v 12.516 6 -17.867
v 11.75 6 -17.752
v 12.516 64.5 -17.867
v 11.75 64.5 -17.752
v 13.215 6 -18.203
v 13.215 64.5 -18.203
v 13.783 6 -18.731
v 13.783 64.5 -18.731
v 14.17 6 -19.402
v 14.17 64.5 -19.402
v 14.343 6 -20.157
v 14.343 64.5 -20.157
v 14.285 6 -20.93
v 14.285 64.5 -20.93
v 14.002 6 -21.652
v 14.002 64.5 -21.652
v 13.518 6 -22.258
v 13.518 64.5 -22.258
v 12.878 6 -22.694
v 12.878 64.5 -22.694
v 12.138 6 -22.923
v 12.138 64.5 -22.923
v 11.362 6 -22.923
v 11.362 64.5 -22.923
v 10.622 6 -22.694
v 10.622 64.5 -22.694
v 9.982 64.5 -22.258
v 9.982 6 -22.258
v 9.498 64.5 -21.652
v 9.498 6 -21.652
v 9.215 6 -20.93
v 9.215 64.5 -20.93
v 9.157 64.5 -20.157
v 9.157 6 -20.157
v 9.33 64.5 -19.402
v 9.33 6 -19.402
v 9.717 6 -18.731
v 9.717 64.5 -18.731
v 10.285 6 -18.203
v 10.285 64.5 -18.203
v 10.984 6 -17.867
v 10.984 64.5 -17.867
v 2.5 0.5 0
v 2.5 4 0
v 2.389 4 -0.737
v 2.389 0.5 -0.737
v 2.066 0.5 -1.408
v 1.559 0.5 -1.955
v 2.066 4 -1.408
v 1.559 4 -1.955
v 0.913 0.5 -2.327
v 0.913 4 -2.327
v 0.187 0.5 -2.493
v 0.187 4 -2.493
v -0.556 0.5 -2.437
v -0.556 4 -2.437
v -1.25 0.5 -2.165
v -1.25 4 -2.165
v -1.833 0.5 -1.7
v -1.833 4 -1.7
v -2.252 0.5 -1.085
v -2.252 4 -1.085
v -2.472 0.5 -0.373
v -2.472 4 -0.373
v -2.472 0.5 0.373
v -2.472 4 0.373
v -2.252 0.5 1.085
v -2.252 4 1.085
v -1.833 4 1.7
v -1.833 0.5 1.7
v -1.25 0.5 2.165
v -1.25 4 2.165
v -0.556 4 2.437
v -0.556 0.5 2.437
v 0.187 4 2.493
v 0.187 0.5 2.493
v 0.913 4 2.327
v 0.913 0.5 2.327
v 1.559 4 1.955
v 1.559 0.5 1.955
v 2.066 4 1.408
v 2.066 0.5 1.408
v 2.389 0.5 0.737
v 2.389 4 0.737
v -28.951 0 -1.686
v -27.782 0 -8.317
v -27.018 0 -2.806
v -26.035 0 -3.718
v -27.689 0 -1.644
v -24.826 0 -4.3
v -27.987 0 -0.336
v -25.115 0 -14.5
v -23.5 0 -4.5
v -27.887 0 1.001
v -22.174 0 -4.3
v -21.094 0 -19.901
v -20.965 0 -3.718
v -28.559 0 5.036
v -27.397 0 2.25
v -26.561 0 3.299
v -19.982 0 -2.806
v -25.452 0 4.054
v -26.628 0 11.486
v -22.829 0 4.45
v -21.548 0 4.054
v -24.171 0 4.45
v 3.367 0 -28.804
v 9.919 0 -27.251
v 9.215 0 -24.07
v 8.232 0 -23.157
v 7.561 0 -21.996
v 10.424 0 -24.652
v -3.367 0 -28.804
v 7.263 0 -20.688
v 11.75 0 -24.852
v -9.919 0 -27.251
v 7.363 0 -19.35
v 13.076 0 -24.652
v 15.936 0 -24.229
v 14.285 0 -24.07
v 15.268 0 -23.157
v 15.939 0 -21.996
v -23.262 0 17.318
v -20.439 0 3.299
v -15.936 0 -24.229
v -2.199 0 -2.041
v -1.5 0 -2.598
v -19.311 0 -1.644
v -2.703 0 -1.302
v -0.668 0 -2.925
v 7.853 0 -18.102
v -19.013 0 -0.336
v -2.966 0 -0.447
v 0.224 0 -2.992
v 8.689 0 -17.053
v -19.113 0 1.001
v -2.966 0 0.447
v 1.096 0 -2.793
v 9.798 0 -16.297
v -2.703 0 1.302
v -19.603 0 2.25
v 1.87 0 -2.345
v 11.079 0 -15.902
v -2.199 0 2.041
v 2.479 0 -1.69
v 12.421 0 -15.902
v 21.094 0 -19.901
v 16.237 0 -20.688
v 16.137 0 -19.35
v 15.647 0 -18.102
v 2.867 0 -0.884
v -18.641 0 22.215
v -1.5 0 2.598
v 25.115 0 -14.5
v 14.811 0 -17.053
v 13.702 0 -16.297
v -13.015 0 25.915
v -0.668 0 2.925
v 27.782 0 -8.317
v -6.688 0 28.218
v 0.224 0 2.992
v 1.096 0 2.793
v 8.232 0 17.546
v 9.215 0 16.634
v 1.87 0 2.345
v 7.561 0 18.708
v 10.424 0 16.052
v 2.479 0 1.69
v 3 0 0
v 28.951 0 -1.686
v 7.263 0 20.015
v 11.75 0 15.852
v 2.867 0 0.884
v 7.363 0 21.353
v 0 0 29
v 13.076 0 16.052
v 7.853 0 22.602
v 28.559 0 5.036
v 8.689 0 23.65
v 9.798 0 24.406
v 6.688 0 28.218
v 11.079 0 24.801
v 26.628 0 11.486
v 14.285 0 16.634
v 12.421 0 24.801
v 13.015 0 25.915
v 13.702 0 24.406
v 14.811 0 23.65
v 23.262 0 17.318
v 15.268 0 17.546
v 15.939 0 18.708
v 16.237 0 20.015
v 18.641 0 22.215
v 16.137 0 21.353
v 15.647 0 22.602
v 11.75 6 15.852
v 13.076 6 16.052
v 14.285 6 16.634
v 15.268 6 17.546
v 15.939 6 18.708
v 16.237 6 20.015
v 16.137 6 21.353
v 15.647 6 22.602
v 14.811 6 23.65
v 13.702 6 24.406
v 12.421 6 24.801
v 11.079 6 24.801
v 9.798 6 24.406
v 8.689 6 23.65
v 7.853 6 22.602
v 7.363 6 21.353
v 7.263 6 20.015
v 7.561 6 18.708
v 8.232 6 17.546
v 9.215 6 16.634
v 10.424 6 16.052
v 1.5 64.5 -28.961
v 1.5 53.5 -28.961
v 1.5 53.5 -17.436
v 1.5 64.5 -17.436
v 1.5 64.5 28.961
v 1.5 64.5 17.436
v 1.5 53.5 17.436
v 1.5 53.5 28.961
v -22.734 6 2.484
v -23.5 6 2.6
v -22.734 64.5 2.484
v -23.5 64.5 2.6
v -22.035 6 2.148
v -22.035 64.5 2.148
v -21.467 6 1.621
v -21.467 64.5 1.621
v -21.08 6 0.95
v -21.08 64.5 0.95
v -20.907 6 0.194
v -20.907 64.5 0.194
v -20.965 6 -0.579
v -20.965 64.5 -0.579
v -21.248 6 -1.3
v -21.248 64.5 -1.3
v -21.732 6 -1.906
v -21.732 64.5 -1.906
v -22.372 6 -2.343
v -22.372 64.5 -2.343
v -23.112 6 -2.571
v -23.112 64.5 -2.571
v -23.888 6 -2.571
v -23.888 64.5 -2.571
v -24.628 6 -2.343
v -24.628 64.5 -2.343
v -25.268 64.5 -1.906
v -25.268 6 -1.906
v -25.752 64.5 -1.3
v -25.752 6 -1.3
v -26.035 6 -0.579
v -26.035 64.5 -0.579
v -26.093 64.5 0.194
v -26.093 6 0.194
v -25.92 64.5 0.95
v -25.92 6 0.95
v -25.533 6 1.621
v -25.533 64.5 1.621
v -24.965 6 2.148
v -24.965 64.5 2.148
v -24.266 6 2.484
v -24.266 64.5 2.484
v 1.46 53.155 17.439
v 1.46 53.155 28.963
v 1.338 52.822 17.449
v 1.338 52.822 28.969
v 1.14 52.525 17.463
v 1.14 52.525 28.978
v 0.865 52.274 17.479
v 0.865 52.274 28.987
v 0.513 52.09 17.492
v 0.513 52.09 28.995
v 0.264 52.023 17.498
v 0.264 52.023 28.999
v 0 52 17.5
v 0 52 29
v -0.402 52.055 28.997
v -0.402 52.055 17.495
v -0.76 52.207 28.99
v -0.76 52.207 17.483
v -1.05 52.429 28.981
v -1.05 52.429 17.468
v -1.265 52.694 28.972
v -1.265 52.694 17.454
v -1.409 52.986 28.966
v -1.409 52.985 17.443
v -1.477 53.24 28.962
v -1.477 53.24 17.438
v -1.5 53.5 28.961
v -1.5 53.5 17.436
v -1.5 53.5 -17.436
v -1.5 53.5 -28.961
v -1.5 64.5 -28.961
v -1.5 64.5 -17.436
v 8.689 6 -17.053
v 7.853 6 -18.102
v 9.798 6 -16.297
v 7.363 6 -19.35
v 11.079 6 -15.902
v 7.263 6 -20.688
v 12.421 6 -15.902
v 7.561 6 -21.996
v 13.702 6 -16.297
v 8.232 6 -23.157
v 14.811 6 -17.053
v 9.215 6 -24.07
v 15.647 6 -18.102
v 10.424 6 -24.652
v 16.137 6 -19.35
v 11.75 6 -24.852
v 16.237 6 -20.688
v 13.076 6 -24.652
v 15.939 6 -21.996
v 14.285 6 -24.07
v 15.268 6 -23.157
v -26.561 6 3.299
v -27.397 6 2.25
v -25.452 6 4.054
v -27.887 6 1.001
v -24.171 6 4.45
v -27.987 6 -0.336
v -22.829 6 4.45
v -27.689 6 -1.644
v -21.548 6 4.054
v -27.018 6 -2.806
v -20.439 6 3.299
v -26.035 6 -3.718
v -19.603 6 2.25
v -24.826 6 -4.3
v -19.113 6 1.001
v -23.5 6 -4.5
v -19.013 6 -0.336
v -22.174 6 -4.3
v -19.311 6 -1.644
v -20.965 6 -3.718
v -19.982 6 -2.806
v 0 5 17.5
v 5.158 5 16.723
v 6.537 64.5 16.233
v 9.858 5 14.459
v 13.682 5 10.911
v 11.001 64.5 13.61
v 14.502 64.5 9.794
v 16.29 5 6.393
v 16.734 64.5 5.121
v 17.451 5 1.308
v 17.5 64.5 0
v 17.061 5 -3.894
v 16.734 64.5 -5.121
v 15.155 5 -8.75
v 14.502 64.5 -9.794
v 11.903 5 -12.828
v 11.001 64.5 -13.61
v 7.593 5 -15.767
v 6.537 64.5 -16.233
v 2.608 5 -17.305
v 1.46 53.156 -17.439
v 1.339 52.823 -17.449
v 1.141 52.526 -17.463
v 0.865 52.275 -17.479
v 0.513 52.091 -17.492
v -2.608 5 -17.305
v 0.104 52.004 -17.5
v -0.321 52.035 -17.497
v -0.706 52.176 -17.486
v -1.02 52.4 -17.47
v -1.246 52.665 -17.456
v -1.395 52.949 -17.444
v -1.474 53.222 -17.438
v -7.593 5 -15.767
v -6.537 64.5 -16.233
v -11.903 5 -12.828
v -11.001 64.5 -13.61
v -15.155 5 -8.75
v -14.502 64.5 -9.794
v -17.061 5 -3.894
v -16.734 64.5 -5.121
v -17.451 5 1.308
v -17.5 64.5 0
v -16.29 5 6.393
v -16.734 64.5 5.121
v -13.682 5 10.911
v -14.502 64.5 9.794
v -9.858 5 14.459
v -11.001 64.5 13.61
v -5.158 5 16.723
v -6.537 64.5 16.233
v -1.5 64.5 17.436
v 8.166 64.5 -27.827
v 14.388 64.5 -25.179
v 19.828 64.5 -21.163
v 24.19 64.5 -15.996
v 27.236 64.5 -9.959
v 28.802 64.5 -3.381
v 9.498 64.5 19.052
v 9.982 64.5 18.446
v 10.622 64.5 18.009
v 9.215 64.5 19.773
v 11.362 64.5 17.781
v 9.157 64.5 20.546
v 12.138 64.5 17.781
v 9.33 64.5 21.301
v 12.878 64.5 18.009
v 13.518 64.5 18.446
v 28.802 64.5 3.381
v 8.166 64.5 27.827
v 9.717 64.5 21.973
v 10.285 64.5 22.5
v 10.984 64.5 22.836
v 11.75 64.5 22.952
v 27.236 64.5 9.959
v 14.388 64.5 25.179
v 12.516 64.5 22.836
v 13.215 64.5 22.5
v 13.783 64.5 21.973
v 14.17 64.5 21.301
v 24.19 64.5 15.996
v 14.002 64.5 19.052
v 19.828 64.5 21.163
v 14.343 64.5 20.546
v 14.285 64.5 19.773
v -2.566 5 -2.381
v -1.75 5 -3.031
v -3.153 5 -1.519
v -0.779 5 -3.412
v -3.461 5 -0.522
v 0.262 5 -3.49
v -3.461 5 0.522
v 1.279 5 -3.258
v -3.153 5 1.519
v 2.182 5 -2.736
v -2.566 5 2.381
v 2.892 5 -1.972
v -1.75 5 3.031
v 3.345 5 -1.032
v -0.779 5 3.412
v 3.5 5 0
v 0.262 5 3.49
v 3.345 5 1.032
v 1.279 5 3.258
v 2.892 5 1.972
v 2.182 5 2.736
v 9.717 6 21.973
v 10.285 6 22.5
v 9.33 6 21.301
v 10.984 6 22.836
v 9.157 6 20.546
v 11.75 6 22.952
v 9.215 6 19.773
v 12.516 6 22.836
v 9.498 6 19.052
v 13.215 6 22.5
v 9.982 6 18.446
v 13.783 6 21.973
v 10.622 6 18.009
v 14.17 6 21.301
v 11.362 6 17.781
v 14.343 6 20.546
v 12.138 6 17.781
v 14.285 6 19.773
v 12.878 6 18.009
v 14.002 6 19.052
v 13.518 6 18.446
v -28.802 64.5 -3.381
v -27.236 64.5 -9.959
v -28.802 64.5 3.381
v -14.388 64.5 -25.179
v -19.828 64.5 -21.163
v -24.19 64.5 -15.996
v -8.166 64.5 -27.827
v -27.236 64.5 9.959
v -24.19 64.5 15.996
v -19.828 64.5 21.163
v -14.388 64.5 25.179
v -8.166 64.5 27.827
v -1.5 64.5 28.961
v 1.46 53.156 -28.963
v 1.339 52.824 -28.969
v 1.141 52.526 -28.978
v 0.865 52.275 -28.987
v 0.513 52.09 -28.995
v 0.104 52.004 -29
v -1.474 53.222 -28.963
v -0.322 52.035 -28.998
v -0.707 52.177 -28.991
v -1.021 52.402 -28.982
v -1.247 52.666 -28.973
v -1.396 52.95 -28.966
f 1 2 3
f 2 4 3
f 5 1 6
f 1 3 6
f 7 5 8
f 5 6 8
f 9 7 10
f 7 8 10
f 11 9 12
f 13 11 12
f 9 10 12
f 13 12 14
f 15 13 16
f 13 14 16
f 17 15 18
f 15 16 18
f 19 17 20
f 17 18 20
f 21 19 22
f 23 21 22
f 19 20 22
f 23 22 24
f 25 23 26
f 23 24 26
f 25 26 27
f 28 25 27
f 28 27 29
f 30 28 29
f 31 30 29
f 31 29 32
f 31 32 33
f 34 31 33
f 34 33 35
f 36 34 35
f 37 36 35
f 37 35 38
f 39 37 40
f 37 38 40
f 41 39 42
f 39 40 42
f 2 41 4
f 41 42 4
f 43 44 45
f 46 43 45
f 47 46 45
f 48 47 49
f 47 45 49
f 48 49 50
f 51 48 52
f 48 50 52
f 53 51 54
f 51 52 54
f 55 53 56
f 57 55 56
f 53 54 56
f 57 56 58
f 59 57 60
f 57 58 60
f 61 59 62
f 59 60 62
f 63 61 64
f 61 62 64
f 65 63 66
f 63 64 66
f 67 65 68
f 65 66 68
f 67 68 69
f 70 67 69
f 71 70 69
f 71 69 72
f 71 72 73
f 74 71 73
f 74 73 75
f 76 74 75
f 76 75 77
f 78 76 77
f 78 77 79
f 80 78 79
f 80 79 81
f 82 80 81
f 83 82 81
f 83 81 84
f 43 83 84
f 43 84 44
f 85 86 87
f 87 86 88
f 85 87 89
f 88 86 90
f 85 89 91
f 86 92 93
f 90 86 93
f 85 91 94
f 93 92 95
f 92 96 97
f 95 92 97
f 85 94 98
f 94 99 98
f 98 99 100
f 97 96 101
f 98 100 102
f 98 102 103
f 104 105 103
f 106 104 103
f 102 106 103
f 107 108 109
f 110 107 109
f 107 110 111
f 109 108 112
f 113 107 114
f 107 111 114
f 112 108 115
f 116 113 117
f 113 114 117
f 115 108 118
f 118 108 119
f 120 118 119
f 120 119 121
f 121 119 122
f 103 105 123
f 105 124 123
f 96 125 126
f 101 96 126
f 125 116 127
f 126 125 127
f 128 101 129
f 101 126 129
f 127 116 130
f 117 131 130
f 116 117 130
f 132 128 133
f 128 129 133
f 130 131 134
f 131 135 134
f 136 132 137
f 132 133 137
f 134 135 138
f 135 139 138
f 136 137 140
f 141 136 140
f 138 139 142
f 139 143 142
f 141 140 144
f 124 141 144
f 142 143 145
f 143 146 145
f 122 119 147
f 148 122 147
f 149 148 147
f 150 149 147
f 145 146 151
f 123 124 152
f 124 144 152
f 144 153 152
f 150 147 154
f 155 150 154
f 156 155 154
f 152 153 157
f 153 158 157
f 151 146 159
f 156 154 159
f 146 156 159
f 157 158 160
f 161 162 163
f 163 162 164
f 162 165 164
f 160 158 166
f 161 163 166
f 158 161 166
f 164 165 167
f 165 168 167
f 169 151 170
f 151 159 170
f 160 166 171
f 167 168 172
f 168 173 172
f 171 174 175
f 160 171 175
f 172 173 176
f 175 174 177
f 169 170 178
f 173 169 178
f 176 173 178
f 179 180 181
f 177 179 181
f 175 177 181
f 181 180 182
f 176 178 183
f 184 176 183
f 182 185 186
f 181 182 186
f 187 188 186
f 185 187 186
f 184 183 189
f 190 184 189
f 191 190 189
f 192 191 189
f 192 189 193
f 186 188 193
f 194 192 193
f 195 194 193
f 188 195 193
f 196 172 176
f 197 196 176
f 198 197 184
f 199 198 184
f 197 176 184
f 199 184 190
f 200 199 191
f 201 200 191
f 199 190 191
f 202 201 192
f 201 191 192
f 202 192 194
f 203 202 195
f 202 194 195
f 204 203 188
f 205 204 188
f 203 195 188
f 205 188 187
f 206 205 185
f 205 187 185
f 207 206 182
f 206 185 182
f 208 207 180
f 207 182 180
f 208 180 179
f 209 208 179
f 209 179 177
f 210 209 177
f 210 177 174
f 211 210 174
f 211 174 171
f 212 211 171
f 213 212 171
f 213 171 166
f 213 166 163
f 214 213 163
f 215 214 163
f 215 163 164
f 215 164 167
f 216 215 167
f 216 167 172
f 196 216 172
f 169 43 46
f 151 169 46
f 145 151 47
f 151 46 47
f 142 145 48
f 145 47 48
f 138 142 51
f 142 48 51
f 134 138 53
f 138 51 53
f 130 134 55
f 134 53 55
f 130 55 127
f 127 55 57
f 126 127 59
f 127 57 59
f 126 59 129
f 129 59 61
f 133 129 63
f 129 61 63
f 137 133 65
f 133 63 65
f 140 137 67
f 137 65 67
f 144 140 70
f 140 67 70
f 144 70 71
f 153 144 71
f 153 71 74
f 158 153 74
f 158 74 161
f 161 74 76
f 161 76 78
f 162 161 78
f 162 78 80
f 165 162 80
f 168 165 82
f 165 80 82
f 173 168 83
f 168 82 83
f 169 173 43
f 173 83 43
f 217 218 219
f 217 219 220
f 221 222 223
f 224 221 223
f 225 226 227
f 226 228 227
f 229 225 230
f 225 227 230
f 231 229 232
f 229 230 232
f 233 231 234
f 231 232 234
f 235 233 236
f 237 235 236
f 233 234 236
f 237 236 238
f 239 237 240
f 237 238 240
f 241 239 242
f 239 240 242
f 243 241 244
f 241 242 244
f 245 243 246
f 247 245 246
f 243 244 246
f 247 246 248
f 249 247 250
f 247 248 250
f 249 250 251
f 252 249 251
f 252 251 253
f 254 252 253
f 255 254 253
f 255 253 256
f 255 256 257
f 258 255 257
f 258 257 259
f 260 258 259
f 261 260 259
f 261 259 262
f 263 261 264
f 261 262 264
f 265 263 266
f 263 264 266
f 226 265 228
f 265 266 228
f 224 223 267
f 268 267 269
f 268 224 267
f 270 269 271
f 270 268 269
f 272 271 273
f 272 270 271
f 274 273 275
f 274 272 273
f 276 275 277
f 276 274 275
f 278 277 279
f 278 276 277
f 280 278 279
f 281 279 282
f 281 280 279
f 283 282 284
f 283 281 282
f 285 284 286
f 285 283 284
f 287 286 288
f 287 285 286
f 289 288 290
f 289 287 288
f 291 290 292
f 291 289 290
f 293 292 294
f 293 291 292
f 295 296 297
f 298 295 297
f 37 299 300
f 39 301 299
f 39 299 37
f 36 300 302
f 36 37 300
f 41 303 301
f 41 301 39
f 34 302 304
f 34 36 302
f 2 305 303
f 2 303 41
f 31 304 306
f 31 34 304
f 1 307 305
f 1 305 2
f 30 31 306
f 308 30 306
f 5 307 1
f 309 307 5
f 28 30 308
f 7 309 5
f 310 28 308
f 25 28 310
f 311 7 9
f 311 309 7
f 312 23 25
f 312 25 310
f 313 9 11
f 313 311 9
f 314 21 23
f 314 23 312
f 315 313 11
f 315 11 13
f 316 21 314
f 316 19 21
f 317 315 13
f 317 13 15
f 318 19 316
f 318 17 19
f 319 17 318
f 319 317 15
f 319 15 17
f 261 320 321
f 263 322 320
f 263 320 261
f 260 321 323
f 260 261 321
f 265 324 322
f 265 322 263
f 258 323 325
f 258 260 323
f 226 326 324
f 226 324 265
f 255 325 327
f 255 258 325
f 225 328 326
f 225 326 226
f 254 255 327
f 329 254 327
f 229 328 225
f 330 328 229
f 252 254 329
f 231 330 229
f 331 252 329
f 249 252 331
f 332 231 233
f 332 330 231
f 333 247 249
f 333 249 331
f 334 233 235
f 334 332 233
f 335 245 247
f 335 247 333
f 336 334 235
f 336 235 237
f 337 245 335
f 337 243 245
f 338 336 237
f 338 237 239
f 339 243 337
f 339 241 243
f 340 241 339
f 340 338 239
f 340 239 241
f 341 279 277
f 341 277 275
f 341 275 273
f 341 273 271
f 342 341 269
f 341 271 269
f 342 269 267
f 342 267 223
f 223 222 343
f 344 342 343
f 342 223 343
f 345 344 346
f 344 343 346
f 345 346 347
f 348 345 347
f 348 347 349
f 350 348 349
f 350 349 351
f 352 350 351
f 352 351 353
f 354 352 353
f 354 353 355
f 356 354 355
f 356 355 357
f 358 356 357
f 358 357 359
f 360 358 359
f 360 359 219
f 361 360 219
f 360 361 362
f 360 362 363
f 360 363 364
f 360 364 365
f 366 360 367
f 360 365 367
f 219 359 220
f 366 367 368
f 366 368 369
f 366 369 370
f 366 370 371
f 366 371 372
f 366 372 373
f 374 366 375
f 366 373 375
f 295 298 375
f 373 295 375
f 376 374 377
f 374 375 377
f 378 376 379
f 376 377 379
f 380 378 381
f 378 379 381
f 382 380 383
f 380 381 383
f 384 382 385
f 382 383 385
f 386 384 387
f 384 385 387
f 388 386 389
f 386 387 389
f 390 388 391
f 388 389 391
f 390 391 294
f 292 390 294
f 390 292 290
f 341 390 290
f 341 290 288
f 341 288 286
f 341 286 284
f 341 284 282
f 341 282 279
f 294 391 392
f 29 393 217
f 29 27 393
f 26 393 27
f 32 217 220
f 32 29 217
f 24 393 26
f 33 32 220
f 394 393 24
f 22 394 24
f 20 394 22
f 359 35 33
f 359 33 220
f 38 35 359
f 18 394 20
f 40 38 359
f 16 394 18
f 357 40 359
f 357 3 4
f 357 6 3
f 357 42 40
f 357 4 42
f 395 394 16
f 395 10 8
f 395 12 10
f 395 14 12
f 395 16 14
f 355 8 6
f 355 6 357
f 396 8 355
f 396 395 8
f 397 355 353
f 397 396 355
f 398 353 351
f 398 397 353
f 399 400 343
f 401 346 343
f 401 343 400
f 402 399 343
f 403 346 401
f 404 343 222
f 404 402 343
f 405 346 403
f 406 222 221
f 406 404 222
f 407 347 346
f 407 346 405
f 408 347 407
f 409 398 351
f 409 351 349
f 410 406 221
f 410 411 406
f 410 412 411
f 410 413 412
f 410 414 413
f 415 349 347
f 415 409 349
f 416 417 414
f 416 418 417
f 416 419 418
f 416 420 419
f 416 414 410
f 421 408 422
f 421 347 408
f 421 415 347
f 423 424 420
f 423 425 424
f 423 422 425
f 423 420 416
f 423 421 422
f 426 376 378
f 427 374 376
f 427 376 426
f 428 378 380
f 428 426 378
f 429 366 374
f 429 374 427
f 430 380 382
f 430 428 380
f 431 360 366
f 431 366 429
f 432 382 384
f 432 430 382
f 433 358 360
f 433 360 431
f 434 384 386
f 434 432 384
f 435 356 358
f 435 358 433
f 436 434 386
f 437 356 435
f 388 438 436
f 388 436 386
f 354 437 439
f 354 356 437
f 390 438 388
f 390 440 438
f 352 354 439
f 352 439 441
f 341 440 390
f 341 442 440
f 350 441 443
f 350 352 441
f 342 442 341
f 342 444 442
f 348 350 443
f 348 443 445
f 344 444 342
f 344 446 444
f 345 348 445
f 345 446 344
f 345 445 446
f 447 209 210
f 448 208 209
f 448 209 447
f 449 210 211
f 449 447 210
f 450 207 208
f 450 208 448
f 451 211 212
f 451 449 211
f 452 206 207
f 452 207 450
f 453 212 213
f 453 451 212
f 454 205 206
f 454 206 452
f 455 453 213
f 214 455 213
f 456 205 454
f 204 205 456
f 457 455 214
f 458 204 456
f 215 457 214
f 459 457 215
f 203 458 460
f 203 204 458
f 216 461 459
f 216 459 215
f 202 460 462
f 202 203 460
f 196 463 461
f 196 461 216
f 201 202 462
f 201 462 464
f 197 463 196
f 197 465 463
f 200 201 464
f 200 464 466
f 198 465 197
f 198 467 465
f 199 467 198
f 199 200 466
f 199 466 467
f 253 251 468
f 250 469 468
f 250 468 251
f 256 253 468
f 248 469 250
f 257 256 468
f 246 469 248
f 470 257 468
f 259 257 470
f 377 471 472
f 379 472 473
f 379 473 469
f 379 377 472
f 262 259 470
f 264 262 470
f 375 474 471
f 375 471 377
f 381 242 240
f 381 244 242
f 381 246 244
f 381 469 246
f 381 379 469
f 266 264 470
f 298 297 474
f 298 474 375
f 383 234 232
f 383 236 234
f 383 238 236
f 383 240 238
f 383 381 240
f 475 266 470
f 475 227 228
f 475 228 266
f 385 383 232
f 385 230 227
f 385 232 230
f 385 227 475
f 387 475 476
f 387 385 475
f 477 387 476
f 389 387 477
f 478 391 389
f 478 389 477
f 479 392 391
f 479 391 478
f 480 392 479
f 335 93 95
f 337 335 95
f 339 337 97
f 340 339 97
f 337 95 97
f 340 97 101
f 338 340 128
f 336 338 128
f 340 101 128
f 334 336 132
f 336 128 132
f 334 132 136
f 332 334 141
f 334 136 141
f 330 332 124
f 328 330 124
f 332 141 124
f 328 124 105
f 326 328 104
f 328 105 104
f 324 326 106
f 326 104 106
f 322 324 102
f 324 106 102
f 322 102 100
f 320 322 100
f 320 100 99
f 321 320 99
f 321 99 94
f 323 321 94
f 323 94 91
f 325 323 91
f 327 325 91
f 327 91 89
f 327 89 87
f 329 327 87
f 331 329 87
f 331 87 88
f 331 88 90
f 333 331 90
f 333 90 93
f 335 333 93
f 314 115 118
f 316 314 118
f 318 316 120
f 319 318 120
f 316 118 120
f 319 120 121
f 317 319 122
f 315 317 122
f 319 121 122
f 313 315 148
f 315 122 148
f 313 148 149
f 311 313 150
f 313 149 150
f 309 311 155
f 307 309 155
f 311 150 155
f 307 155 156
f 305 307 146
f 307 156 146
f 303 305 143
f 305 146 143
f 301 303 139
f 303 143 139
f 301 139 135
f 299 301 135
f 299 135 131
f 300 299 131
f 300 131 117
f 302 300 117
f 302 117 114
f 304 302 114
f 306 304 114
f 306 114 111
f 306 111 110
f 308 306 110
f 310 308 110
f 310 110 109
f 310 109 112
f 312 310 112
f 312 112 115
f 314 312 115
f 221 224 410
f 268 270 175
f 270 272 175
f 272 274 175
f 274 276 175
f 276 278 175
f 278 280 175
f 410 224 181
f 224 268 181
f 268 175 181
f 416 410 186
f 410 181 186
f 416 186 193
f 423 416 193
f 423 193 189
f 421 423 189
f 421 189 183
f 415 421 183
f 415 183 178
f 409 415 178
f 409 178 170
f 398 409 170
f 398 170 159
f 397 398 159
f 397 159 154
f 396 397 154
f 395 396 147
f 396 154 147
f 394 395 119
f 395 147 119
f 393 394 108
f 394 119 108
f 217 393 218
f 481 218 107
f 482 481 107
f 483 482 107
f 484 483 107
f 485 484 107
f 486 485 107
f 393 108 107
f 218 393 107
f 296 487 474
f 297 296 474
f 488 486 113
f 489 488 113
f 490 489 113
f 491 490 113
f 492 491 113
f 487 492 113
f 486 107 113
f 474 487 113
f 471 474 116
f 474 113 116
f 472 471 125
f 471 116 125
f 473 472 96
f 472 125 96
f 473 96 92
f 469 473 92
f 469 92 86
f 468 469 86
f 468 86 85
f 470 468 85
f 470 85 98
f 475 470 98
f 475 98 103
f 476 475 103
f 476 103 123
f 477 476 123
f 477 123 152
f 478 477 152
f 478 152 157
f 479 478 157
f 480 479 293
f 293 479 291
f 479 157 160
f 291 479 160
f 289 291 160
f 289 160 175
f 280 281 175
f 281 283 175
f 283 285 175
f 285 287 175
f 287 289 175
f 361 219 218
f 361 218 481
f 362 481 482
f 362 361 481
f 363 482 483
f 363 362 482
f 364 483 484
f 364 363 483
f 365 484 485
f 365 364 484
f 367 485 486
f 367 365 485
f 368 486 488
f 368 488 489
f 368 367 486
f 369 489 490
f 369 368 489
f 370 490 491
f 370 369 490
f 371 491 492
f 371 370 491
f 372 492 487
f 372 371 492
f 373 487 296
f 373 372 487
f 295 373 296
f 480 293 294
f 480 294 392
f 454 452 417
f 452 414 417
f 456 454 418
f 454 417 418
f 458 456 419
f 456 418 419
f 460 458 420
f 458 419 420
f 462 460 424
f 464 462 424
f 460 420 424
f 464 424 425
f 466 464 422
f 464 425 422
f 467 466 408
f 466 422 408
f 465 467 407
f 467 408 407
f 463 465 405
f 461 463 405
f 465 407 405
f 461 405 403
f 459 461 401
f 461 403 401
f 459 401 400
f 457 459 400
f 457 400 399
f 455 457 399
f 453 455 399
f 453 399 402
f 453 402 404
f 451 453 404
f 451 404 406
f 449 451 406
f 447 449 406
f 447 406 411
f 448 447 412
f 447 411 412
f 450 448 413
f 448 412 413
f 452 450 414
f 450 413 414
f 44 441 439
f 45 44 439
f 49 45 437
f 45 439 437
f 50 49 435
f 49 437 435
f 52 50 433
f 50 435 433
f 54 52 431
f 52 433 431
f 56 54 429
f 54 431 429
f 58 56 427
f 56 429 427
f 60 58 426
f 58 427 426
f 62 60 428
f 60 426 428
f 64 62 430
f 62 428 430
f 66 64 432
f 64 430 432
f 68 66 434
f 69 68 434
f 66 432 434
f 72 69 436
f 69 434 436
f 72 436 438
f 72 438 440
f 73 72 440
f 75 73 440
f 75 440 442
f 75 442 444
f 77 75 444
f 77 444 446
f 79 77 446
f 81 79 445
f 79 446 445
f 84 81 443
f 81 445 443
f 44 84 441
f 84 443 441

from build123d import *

# Parameters (mm, degrees)
IZIM1_R                                           = 29
Y_KSEKLIK_EKSTR_ZYON1_DEPTH                       = 64.5
IZIM2_R                                           = 17.5
KES_EKSTR_ZYON1_DEPTH                             = 59.5
F_5_0_5_AP_DELIK1_D                               = 5
F_5_0_5_AP_DELIK1_DEPTH                           = 6
F_5_0_5_AP_DELIK1_TIP                             = 0.909925586
PAH1_SIZE                                         = 0.5
PAH2_SIZE                                         = 1
KES_EKSTR_ZYON2_DEPTH                             = 92.461740635
IZIM15_W                                          = 3
IZIM15_H                                          = 10
KES_EKSTR_ZYON4_DEPTH                             = 92.461740801
M5_ALT_GEN_ALYAN_BA_L_K_R_VIDA_IN_HAV_D           = 5.2
M5_ALT_GEN_ALYAN_BA_L_K_R_VIDA_IN_HAV_DEPTH       = 87.053677391
M5_ALT_GEN_ALYAN_BA_L_K_R_VIDA_IN_HAV_CBORE_D     = 9
M5_ALT_GEN_ALYAN_BA_L_K_R_VIDA_IN_HAV_CBORE_DEPTH = 6
M5_ALT_GEN_ALYAN_BA_L_K_R_VIDA_IN_HAV_TIP         = 0.946322609


with BuildPart() as part:
    # Çizim1 → Yükseklik-Ekstrüzyon1 (new body)
    with BuildSketch(Plane(origin=(0, 0, 0), x_dir=(1, 0, 0), z_dir=(0, 1, 0))):
        with Locations(Location((0, 0, 0), (0, 0, 270))):
            Circle(IZIM1_R)
    extrude(amount=Y_KSEKLIK_EKSTR_ZYON1_DEPTH)

    # Çizim2 → Kes-Ekstrüzyon1 (cut)
    with BuildSketch(Plane(origin=(0, 64.5, 0), x_dir=(1, 0, 0), z_dir=(0, 1, 0))):
        with Locations(Location((0, 0, 0), (0, 0, 270))):
            Circle(IZIM2_R)
    extrude(amount=-KES_EKSTR_ZYON1_DEPTH, mode=Mode.SUBTRACT)

    # Ø5.0 (5) Çap Delik1
    with Locations(Plane(origin=(0, 0, 0), x_dir=(-1, 0, 0), z_dir=(0, -1, 0))):
        with Locations((0, 0)):
            Hole(F_5_0_5_AP_DELIK1_D / 2, depth=F_5_0_5_AP_DELIK1_DEPTH)
            with Locations((0, 0, -(F_5_0_5_AP_DELIK1_DEPTH + F_5_0_5_AP_DELIK1_TIP / 2))):  # 140° drill point
                Cone(0, F_5_0_5_AP_DELIK1_D / 2, F_5_0_5_AP_DELIK1_TIP, mode=Mode.SUBTRACT)

    # Pah1
    pah1_edges = [part.edges().sort_by_distance(p)[0] for p in [
        (-2.5, 0, 0),
    ]]
    chamfer(pah1_edges, length=PAH1_SIZE)

    # Pah2
    pah2_edges = [part.edges().sort_by_distance(p)[0] for p in [
        (-2.5, 5, 0),
    ]]
    chamfer(pah2_edges, length=PAH2_SIZE)

    # Çizim6 → Kes-Ekstrüzyon2 (cut, through all)
    with BuildSketch(Plane.XY.offset(29)):
        with BuildLine():
            Line((-1.5, 53.5), (-1.5, 55.5))
            ThreePointArc((-1.5, 55.5), (0, 57), (1.5, 55.5))
            Line((1.5, 55.5), (1.5, 53.5))
            ThreePointArc((1.5, 53.5), (0, 52), (-1.5, 53.5))
        make_face()
    extrude(amount=-KES_EKSTR_ZYON2_DEPTH, mode=Mode.SUBTRACT)

    # Çizim15 → Kes-Ekstrüzyon4 (cut, through all)
    with BuildSketch(Plane.XY.offset(29)):
        with Locations((0, 59.5)):
            Rectangle(IZIM15_W, IZIM15_H)
    extrude(amount=-KES_EKSTR_ZYON4_DEPTH, mode=Mode.SUBTRACT)

    # M5 Altıgen Alyan Başlı Kör Vida İçin Havşa2
    with Locations(Plane(origin=(11.75, 0, 20.351596989), x_dir=(0, 0, -1), z_dir=(0, -1, 0))):
        with Locations((0, 0), (40.703193978, 0), (20.351596989, -35.25)):
            CounterBoreHole(M5_ALT_GEN_ALYAN_BA_L_K_R_VIDA_IN_HAV_D / 2, M5_ALT_GEN_ALYAN_BA_L_K_R_VIDA_IN_HAV_CBORE_D / 2, M5_ALT_GEN_ALYAN_BA_L_K_R_VIDA_IN_HAV_CBORE_DEPTH, depth=M5_ALT_GEN_ALYAN_BA_L_K_R_VIDA_IN_HAV_DEPTH)
            with Locations((0, 0, -(M5_ALT_GEN_ALYAN_BA_L_K_R_VIDA_IN_HAV_DEPTH + M5_ALT_GEN_ALYAN_BA_L_K_R_VIDA_IN_HAV_TIP / 2))):  # 140° drill point
                Cone(0, M5_ALT_GEN_ALYAN_BA_L_K_R_VIDA_IN_HAV_D / 2, M5_ALT_GEN_ALYAN_BA_L_K_R_VIDA_IN_HAV_TIP, mode=Mode.SUBTRACT)


solid = part.part
